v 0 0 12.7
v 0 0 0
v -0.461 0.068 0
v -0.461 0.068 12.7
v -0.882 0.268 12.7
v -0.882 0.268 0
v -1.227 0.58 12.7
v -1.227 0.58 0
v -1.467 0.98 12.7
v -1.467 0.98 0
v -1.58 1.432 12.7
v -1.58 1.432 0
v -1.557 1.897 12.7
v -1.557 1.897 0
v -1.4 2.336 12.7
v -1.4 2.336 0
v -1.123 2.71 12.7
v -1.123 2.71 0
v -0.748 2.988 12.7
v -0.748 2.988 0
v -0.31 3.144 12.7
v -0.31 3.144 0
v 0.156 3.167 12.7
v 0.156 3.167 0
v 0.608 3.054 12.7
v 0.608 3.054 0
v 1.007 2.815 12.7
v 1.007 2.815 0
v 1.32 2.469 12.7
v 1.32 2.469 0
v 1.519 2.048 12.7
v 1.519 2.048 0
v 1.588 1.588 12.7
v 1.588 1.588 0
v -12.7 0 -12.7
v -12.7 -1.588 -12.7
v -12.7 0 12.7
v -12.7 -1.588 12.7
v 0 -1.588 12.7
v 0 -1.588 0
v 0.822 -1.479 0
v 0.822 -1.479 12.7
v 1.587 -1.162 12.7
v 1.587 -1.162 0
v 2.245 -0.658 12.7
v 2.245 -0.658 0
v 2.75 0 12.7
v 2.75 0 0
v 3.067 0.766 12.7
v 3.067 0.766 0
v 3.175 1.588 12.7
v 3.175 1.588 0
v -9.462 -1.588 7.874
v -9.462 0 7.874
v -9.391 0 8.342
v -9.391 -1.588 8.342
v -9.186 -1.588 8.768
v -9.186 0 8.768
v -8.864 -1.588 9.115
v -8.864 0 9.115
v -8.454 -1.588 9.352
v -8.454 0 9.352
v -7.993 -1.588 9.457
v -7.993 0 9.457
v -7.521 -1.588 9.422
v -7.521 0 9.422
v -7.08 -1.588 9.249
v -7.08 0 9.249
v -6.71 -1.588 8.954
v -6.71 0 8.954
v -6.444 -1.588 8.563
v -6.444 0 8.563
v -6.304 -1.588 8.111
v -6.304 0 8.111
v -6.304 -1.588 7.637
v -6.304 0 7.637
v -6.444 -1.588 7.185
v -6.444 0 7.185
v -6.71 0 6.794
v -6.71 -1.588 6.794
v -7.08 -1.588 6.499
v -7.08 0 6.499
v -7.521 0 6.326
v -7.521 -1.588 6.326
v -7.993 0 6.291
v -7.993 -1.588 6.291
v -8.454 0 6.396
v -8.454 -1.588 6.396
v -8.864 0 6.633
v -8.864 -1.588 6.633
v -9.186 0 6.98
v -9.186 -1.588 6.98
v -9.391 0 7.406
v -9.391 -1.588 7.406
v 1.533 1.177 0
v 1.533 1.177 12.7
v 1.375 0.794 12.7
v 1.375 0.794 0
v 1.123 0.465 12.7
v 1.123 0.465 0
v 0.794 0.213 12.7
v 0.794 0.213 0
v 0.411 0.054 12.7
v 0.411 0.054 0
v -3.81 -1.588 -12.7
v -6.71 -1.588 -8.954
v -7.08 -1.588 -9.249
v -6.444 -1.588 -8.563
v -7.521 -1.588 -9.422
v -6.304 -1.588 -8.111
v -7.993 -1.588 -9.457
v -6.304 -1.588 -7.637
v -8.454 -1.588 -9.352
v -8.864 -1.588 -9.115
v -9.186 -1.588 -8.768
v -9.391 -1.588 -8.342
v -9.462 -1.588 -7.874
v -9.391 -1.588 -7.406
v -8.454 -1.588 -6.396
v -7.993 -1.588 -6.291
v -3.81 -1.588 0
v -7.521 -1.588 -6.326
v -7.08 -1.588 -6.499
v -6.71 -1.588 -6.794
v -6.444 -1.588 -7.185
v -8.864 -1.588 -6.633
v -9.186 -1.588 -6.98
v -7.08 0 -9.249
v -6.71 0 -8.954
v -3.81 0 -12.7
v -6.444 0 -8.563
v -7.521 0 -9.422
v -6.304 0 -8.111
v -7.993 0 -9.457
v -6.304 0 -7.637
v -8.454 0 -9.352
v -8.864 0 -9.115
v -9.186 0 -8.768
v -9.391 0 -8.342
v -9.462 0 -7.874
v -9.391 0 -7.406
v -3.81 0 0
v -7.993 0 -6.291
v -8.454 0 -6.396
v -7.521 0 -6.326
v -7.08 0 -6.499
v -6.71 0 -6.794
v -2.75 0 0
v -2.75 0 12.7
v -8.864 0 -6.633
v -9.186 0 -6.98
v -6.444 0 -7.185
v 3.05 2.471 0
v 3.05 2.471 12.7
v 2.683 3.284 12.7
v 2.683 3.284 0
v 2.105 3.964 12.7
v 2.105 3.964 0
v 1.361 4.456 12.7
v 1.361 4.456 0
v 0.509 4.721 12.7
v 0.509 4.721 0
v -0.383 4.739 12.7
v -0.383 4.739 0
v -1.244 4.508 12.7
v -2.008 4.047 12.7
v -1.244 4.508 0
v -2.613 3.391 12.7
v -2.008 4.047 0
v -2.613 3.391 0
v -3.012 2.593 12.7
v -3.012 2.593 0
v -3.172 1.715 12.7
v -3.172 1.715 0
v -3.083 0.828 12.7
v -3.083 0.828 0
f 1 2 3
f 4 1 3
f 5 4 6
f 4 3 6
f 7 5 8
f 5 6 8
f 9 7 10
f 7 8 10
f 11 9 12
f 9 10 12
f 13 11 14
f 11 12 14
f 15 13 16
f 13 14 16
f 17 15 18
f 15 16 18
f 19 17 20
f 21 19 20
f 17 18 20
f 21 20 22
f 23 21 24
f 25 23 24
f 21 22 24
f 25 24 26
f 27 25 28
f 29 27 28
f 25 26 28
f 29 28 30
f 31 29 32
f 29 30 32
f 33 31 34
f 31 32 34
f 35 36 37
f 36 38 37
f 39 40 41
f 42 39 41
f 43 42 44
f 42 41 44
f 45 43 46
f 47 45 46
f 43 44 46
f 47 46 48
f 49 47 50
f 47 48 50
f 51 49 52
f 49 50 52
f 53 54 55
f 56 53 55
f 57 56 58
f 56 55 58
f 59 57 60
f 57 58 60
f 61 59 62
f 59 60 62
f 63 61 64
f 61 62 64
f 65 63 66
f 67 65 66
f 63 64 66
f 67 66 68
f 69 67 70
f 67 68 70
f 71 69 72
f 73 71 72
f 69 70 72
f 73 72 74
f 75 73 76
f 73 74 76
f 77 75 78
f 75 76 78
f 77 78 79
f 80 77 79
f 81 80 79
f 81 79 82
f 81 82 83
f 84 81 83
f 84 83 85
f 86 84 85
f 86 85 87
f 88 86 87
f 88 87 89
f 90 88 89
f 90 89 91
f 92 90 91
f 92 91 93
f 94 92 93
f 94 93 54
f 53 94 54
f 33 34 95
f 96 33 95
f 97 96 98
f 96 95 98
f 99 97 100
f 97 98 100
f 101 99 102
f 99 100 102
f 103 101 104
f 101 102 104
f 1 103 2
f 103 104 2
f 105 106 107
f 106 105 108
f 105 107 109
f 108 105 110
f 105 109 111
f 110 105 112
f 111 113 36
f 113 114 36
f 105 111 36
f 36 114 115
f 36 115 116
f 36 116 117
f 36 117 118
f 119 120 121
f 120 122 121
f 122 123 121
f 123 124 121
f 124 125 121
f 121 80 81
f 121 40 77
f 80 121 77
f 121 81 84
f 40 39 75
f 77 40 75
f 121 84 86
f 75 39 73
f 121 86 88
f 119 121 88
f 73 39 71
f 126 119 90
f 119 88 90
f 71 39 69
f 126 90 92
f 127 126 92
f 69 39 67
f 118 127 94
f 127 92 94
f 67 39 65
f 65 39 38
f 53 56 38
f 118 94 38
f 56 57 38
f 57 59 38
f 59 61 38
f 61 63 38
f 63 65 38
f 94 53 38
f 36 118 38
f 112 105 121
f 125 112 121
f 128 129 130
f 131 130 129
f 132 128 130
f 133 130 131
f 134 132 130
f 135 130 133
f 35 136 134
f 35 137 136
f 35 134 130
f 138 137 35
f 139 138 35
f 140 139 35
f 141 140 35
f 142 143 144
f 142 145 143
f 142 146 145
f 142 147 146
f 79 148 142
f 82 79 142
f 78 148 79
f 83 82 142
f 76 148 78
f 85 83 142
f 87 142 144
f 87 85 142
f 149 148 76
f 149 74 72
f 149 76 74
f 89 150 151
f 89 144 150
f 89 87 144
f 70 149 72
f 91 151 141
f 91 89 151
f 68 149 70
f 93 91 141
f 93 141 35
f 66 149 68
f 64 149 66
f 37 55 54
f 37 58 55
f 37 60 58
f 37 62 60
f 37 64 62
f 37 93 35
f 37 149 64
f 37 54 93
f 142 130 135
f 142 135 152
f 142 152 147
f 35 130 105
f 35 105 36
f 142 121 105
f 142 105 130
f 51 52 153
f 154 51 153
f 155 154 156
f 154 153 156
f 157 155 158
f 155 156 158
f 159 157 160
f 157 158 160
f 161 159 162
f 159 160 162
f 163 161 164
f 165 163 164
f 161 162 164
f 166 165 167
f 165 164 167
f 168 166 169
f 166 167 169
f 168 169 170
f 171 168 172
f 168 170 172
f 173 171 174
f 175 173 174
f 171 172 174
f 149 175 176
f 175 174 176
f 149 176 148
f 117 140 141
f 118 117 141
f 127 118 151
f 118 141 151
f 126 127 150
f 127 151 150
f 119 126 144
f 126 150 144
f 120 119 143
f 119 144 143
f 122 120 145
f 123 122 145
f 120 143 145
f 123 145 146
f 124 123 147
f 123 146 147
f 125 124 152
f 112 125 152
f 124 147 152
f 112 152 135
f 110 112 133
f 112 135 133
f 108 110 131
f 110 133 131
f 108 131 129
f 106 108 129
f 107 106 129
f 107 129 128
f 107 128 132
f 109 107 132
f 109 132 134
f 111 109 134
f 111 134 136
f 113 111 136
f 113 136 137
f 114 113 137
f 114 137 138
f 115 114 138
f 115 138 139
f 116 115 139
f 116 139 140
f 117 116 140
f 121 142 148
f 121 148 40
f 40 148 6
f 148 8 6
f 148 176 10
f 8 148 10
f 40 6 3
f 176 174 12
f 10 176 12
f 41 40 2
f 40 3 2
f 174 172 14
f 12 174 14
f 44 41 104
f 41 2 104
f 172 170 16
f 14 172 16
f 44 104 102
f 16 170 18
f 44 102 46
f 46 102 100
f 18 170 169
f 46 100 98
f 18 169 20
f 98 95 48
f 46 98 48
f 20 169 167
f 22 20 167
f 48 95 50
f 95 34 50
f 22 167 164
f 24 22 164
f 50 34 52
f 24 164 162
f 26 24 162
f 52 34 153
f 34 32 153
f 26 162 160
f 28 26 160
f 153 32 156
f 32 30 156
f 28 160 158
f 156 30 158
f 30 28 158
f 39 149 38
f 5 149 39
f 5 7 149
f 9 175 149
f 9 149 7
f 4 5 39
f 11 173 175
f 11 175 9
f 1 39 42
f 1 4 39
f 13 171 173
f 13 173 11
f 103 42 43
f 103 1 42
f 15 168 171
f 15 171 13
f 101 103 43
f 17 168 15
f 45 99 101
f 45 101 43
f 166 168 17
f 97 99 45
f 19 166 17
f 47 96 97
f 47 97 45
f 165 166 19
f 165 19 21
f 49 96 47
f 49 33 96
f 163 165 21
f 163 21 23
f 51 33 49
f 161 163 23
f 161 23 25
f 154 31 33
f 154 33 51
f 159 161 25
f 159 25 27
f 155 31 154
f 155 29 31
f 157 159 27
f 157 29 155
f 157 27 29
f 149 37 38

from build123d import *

# Parameters (mm, degrees)
BOSS_EXTRUDE1_DEPTH = 12.7
SKETCH2_W           = 8.89
SKETCH2_H           = 1.5875
BOSS_EXTRUDE2_DEPTH = 12.7
SKETCH3_R           = 1.5875
CUT_EXTRUDE1_DEPTH  = 17.78


with BuildPart() as part:
    # Sketch1 → Boss-Extrude1 (new body)
    # profile 1 of 3: a face of its own
    with BuildSketch(Plane.XY):
        with BuildLine():
            ThreePointArc((0, -1.5875), (-1.5875, -1.162130657), (-2.749630657, 0))
            Line((-2.749630657, 0), (-12.7, 0))
            Line((-12.7, 0), (-12.7, -1.5875))
            Line((-12.7, -1.5875), (0, -1.5875))
        make_face()
    # profile 2 of 3: a face of its own
    with BuildSketch(Plane.XY):
        with BuildLine():
            Line((0, -1.5875), (0, 0))
            Line((0, 0), (-2.749630657, 0))
            ThreePointArc((-2.749630657, 0), (-1.5875, -1.162130657), (0, -1.5875))
        make_face()
    # profile 3 of 3: a face of its own
    with BuildSketch(Plane.XY):
        with BuildLine():
            Line((-2.749630657, 0), (0, 0))
            Line((0, 0), (0, -1.5875))
            ThreePointArc((0, -1.5875), (2.24506403, -0.65756403), (3.175, 1.5875))
            ThreePointArc((3.175, 1.5875), (-0.821750468, 4.654314498), (-2.749630657, 0))
        make_face()
        with BuildLine():
            ThreePointArc((1.5875, 1.5875), (1.122532015, 0.464967985), (0, 0))
            ThreePointArc((0, 0), (-1.122532015, 2.710032015), (1.5875, 1.5875))
        make_face(mode=Mode.SUBTRACT)
    extrude(amount=BOSS_EXTRUDE1_DEPTH)

    # Sketch2 → Boss-Extrude2 (add)
    with BuildSketch(Plane(origin=(0, 0, 0), x_dir=(-1, 0, 0), z_dir=(0, 0, -1))):
        with Locations((8.255, -0.79375)):
            Rectangle(SKETCH2_W, SKETCH2_H)
    extrude(amount=BOSS_EXTRUDE2_DEPTH)

    # Sketch3 → Cut-Extrude1 (cut)
    with BuildSketch(Plane(origin=(0, 0, 0), x_dir=(1, 0, 0), z_dir=(0, 1, 0))):
        with Locations(Location((-7.874, 7.874, 0), (0, 0, 180))):
            Circle(SKETCH3_R)
        with Locations(Location((-7.874, -7.874, 0), (0, 0, 180))):
            Circle(SKETCH3_R)
    extrude(amount=-CUT_EXTRUDE1_DEPTH, mode=Mode.SUBTRACT)


solid = part.part
